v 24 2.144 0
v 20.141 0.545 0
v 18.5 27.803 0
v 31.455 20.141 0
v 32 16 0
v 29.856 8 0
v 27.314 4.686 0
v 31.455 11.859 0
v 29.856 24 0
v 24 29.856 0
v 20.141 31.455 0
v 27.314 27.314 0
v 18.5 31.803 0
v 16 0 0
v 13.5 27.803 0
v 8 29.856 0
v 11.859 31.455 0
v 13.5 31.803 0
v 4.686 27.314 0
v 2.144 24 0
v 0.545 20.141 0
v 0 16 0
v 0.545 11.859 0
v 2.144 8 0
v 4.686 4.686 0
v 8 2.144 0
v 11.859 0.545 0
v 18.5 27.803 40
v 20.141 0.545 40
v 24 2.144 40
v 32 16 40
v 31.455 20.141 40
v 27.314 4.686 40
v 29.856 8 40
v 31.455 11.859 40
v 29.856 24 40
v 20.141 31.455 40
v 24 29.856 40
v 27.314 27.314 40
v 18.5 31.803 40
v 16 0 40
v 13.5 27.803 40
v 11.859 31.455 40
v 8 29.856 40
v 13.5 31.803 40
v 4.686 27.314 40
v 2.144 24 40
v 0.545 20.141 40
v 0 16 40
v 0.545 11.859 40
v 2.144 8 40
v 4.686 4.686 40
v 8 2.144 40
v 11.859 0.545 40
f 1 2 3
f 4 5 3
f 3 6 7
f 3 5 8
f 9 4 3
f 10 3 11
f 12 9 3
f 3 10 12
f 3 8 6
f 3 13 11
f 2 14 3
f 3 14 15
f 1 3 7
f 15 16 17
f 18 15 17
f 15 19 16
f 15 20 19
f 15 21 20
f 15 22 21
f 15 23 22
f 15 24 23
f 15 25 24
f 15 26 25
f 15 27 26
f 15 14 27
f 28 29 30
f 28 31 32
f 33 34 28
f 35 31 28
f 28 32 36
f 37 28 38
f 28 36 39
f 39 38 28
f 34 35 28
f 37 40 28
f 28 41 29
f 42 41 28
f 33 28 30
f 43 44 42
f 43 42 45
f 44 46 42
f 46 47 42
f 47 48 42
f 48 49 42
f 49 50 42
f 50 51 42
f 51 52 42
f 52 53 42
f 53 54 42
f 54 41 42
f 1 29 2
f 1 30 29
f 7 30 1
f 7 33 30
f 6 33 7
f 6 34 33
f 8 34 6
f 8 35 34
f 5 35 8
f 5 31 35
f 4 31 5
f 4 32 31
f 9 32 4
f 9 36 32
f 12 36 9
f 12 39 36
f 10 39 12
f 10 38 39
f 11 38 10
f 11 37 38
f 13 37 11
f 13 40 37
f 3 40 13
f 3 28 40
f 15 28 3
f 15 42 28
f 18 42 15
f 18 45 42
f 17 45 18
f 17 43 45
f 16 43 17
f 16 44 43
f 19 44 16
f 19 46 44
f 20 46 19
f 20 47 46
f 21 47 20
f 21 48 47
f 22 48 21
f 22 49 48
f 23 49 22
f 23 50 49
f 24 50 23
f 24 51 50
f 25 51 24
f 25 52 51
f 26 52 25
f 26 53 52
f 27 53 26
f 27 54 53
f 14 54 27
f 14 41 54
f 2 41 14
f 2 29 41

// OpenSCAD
$fn = 32;

// ----------------------------------------------------------------------
// Keyway shaft: d32 shaft, key 5 x 4 mm
// ----------------------------------------------------------------------

// --- parameters (mm) ---
shaft_r = 16;             // shaft radius
key_w = 5;                // keyway width
key_d = 4;                // keyway depth below the surface line
plate_t = 40;             // shaft length, Z (extrusion height)

shaft_d = 2 * shaft_r;  // shaft diameter
circle_step = 15;  // polygon sampling step, degrees

profile = [[11.859, 31.455], [8, 29.856], [4.686, 27.314], [2.144, 24], [0.545, 20.141], [0, 16], [0.545, 11.859], [2.144, 8], [4.686, 4.686], [8, 2.144], [11.859, 0.545], [16, 0], [20.141, 0.545], [24, 2.144], [27.314, 4.686], [29.856, 8], [31.455, 11.859], [32, 16], [31.455, 20.141], [29.856, 24], [27.314, 27.314], [24, 29.856], [20.141, 31.455], [18.5, 31.803], [18.5, 27.803], [13.5, 27.803], [13.5, 31.803]];  // primary outline, 27 points, counter clockwise

// --- the one profile operation ---
linear_extrude(height = plate_t) polygon(points = profile);
